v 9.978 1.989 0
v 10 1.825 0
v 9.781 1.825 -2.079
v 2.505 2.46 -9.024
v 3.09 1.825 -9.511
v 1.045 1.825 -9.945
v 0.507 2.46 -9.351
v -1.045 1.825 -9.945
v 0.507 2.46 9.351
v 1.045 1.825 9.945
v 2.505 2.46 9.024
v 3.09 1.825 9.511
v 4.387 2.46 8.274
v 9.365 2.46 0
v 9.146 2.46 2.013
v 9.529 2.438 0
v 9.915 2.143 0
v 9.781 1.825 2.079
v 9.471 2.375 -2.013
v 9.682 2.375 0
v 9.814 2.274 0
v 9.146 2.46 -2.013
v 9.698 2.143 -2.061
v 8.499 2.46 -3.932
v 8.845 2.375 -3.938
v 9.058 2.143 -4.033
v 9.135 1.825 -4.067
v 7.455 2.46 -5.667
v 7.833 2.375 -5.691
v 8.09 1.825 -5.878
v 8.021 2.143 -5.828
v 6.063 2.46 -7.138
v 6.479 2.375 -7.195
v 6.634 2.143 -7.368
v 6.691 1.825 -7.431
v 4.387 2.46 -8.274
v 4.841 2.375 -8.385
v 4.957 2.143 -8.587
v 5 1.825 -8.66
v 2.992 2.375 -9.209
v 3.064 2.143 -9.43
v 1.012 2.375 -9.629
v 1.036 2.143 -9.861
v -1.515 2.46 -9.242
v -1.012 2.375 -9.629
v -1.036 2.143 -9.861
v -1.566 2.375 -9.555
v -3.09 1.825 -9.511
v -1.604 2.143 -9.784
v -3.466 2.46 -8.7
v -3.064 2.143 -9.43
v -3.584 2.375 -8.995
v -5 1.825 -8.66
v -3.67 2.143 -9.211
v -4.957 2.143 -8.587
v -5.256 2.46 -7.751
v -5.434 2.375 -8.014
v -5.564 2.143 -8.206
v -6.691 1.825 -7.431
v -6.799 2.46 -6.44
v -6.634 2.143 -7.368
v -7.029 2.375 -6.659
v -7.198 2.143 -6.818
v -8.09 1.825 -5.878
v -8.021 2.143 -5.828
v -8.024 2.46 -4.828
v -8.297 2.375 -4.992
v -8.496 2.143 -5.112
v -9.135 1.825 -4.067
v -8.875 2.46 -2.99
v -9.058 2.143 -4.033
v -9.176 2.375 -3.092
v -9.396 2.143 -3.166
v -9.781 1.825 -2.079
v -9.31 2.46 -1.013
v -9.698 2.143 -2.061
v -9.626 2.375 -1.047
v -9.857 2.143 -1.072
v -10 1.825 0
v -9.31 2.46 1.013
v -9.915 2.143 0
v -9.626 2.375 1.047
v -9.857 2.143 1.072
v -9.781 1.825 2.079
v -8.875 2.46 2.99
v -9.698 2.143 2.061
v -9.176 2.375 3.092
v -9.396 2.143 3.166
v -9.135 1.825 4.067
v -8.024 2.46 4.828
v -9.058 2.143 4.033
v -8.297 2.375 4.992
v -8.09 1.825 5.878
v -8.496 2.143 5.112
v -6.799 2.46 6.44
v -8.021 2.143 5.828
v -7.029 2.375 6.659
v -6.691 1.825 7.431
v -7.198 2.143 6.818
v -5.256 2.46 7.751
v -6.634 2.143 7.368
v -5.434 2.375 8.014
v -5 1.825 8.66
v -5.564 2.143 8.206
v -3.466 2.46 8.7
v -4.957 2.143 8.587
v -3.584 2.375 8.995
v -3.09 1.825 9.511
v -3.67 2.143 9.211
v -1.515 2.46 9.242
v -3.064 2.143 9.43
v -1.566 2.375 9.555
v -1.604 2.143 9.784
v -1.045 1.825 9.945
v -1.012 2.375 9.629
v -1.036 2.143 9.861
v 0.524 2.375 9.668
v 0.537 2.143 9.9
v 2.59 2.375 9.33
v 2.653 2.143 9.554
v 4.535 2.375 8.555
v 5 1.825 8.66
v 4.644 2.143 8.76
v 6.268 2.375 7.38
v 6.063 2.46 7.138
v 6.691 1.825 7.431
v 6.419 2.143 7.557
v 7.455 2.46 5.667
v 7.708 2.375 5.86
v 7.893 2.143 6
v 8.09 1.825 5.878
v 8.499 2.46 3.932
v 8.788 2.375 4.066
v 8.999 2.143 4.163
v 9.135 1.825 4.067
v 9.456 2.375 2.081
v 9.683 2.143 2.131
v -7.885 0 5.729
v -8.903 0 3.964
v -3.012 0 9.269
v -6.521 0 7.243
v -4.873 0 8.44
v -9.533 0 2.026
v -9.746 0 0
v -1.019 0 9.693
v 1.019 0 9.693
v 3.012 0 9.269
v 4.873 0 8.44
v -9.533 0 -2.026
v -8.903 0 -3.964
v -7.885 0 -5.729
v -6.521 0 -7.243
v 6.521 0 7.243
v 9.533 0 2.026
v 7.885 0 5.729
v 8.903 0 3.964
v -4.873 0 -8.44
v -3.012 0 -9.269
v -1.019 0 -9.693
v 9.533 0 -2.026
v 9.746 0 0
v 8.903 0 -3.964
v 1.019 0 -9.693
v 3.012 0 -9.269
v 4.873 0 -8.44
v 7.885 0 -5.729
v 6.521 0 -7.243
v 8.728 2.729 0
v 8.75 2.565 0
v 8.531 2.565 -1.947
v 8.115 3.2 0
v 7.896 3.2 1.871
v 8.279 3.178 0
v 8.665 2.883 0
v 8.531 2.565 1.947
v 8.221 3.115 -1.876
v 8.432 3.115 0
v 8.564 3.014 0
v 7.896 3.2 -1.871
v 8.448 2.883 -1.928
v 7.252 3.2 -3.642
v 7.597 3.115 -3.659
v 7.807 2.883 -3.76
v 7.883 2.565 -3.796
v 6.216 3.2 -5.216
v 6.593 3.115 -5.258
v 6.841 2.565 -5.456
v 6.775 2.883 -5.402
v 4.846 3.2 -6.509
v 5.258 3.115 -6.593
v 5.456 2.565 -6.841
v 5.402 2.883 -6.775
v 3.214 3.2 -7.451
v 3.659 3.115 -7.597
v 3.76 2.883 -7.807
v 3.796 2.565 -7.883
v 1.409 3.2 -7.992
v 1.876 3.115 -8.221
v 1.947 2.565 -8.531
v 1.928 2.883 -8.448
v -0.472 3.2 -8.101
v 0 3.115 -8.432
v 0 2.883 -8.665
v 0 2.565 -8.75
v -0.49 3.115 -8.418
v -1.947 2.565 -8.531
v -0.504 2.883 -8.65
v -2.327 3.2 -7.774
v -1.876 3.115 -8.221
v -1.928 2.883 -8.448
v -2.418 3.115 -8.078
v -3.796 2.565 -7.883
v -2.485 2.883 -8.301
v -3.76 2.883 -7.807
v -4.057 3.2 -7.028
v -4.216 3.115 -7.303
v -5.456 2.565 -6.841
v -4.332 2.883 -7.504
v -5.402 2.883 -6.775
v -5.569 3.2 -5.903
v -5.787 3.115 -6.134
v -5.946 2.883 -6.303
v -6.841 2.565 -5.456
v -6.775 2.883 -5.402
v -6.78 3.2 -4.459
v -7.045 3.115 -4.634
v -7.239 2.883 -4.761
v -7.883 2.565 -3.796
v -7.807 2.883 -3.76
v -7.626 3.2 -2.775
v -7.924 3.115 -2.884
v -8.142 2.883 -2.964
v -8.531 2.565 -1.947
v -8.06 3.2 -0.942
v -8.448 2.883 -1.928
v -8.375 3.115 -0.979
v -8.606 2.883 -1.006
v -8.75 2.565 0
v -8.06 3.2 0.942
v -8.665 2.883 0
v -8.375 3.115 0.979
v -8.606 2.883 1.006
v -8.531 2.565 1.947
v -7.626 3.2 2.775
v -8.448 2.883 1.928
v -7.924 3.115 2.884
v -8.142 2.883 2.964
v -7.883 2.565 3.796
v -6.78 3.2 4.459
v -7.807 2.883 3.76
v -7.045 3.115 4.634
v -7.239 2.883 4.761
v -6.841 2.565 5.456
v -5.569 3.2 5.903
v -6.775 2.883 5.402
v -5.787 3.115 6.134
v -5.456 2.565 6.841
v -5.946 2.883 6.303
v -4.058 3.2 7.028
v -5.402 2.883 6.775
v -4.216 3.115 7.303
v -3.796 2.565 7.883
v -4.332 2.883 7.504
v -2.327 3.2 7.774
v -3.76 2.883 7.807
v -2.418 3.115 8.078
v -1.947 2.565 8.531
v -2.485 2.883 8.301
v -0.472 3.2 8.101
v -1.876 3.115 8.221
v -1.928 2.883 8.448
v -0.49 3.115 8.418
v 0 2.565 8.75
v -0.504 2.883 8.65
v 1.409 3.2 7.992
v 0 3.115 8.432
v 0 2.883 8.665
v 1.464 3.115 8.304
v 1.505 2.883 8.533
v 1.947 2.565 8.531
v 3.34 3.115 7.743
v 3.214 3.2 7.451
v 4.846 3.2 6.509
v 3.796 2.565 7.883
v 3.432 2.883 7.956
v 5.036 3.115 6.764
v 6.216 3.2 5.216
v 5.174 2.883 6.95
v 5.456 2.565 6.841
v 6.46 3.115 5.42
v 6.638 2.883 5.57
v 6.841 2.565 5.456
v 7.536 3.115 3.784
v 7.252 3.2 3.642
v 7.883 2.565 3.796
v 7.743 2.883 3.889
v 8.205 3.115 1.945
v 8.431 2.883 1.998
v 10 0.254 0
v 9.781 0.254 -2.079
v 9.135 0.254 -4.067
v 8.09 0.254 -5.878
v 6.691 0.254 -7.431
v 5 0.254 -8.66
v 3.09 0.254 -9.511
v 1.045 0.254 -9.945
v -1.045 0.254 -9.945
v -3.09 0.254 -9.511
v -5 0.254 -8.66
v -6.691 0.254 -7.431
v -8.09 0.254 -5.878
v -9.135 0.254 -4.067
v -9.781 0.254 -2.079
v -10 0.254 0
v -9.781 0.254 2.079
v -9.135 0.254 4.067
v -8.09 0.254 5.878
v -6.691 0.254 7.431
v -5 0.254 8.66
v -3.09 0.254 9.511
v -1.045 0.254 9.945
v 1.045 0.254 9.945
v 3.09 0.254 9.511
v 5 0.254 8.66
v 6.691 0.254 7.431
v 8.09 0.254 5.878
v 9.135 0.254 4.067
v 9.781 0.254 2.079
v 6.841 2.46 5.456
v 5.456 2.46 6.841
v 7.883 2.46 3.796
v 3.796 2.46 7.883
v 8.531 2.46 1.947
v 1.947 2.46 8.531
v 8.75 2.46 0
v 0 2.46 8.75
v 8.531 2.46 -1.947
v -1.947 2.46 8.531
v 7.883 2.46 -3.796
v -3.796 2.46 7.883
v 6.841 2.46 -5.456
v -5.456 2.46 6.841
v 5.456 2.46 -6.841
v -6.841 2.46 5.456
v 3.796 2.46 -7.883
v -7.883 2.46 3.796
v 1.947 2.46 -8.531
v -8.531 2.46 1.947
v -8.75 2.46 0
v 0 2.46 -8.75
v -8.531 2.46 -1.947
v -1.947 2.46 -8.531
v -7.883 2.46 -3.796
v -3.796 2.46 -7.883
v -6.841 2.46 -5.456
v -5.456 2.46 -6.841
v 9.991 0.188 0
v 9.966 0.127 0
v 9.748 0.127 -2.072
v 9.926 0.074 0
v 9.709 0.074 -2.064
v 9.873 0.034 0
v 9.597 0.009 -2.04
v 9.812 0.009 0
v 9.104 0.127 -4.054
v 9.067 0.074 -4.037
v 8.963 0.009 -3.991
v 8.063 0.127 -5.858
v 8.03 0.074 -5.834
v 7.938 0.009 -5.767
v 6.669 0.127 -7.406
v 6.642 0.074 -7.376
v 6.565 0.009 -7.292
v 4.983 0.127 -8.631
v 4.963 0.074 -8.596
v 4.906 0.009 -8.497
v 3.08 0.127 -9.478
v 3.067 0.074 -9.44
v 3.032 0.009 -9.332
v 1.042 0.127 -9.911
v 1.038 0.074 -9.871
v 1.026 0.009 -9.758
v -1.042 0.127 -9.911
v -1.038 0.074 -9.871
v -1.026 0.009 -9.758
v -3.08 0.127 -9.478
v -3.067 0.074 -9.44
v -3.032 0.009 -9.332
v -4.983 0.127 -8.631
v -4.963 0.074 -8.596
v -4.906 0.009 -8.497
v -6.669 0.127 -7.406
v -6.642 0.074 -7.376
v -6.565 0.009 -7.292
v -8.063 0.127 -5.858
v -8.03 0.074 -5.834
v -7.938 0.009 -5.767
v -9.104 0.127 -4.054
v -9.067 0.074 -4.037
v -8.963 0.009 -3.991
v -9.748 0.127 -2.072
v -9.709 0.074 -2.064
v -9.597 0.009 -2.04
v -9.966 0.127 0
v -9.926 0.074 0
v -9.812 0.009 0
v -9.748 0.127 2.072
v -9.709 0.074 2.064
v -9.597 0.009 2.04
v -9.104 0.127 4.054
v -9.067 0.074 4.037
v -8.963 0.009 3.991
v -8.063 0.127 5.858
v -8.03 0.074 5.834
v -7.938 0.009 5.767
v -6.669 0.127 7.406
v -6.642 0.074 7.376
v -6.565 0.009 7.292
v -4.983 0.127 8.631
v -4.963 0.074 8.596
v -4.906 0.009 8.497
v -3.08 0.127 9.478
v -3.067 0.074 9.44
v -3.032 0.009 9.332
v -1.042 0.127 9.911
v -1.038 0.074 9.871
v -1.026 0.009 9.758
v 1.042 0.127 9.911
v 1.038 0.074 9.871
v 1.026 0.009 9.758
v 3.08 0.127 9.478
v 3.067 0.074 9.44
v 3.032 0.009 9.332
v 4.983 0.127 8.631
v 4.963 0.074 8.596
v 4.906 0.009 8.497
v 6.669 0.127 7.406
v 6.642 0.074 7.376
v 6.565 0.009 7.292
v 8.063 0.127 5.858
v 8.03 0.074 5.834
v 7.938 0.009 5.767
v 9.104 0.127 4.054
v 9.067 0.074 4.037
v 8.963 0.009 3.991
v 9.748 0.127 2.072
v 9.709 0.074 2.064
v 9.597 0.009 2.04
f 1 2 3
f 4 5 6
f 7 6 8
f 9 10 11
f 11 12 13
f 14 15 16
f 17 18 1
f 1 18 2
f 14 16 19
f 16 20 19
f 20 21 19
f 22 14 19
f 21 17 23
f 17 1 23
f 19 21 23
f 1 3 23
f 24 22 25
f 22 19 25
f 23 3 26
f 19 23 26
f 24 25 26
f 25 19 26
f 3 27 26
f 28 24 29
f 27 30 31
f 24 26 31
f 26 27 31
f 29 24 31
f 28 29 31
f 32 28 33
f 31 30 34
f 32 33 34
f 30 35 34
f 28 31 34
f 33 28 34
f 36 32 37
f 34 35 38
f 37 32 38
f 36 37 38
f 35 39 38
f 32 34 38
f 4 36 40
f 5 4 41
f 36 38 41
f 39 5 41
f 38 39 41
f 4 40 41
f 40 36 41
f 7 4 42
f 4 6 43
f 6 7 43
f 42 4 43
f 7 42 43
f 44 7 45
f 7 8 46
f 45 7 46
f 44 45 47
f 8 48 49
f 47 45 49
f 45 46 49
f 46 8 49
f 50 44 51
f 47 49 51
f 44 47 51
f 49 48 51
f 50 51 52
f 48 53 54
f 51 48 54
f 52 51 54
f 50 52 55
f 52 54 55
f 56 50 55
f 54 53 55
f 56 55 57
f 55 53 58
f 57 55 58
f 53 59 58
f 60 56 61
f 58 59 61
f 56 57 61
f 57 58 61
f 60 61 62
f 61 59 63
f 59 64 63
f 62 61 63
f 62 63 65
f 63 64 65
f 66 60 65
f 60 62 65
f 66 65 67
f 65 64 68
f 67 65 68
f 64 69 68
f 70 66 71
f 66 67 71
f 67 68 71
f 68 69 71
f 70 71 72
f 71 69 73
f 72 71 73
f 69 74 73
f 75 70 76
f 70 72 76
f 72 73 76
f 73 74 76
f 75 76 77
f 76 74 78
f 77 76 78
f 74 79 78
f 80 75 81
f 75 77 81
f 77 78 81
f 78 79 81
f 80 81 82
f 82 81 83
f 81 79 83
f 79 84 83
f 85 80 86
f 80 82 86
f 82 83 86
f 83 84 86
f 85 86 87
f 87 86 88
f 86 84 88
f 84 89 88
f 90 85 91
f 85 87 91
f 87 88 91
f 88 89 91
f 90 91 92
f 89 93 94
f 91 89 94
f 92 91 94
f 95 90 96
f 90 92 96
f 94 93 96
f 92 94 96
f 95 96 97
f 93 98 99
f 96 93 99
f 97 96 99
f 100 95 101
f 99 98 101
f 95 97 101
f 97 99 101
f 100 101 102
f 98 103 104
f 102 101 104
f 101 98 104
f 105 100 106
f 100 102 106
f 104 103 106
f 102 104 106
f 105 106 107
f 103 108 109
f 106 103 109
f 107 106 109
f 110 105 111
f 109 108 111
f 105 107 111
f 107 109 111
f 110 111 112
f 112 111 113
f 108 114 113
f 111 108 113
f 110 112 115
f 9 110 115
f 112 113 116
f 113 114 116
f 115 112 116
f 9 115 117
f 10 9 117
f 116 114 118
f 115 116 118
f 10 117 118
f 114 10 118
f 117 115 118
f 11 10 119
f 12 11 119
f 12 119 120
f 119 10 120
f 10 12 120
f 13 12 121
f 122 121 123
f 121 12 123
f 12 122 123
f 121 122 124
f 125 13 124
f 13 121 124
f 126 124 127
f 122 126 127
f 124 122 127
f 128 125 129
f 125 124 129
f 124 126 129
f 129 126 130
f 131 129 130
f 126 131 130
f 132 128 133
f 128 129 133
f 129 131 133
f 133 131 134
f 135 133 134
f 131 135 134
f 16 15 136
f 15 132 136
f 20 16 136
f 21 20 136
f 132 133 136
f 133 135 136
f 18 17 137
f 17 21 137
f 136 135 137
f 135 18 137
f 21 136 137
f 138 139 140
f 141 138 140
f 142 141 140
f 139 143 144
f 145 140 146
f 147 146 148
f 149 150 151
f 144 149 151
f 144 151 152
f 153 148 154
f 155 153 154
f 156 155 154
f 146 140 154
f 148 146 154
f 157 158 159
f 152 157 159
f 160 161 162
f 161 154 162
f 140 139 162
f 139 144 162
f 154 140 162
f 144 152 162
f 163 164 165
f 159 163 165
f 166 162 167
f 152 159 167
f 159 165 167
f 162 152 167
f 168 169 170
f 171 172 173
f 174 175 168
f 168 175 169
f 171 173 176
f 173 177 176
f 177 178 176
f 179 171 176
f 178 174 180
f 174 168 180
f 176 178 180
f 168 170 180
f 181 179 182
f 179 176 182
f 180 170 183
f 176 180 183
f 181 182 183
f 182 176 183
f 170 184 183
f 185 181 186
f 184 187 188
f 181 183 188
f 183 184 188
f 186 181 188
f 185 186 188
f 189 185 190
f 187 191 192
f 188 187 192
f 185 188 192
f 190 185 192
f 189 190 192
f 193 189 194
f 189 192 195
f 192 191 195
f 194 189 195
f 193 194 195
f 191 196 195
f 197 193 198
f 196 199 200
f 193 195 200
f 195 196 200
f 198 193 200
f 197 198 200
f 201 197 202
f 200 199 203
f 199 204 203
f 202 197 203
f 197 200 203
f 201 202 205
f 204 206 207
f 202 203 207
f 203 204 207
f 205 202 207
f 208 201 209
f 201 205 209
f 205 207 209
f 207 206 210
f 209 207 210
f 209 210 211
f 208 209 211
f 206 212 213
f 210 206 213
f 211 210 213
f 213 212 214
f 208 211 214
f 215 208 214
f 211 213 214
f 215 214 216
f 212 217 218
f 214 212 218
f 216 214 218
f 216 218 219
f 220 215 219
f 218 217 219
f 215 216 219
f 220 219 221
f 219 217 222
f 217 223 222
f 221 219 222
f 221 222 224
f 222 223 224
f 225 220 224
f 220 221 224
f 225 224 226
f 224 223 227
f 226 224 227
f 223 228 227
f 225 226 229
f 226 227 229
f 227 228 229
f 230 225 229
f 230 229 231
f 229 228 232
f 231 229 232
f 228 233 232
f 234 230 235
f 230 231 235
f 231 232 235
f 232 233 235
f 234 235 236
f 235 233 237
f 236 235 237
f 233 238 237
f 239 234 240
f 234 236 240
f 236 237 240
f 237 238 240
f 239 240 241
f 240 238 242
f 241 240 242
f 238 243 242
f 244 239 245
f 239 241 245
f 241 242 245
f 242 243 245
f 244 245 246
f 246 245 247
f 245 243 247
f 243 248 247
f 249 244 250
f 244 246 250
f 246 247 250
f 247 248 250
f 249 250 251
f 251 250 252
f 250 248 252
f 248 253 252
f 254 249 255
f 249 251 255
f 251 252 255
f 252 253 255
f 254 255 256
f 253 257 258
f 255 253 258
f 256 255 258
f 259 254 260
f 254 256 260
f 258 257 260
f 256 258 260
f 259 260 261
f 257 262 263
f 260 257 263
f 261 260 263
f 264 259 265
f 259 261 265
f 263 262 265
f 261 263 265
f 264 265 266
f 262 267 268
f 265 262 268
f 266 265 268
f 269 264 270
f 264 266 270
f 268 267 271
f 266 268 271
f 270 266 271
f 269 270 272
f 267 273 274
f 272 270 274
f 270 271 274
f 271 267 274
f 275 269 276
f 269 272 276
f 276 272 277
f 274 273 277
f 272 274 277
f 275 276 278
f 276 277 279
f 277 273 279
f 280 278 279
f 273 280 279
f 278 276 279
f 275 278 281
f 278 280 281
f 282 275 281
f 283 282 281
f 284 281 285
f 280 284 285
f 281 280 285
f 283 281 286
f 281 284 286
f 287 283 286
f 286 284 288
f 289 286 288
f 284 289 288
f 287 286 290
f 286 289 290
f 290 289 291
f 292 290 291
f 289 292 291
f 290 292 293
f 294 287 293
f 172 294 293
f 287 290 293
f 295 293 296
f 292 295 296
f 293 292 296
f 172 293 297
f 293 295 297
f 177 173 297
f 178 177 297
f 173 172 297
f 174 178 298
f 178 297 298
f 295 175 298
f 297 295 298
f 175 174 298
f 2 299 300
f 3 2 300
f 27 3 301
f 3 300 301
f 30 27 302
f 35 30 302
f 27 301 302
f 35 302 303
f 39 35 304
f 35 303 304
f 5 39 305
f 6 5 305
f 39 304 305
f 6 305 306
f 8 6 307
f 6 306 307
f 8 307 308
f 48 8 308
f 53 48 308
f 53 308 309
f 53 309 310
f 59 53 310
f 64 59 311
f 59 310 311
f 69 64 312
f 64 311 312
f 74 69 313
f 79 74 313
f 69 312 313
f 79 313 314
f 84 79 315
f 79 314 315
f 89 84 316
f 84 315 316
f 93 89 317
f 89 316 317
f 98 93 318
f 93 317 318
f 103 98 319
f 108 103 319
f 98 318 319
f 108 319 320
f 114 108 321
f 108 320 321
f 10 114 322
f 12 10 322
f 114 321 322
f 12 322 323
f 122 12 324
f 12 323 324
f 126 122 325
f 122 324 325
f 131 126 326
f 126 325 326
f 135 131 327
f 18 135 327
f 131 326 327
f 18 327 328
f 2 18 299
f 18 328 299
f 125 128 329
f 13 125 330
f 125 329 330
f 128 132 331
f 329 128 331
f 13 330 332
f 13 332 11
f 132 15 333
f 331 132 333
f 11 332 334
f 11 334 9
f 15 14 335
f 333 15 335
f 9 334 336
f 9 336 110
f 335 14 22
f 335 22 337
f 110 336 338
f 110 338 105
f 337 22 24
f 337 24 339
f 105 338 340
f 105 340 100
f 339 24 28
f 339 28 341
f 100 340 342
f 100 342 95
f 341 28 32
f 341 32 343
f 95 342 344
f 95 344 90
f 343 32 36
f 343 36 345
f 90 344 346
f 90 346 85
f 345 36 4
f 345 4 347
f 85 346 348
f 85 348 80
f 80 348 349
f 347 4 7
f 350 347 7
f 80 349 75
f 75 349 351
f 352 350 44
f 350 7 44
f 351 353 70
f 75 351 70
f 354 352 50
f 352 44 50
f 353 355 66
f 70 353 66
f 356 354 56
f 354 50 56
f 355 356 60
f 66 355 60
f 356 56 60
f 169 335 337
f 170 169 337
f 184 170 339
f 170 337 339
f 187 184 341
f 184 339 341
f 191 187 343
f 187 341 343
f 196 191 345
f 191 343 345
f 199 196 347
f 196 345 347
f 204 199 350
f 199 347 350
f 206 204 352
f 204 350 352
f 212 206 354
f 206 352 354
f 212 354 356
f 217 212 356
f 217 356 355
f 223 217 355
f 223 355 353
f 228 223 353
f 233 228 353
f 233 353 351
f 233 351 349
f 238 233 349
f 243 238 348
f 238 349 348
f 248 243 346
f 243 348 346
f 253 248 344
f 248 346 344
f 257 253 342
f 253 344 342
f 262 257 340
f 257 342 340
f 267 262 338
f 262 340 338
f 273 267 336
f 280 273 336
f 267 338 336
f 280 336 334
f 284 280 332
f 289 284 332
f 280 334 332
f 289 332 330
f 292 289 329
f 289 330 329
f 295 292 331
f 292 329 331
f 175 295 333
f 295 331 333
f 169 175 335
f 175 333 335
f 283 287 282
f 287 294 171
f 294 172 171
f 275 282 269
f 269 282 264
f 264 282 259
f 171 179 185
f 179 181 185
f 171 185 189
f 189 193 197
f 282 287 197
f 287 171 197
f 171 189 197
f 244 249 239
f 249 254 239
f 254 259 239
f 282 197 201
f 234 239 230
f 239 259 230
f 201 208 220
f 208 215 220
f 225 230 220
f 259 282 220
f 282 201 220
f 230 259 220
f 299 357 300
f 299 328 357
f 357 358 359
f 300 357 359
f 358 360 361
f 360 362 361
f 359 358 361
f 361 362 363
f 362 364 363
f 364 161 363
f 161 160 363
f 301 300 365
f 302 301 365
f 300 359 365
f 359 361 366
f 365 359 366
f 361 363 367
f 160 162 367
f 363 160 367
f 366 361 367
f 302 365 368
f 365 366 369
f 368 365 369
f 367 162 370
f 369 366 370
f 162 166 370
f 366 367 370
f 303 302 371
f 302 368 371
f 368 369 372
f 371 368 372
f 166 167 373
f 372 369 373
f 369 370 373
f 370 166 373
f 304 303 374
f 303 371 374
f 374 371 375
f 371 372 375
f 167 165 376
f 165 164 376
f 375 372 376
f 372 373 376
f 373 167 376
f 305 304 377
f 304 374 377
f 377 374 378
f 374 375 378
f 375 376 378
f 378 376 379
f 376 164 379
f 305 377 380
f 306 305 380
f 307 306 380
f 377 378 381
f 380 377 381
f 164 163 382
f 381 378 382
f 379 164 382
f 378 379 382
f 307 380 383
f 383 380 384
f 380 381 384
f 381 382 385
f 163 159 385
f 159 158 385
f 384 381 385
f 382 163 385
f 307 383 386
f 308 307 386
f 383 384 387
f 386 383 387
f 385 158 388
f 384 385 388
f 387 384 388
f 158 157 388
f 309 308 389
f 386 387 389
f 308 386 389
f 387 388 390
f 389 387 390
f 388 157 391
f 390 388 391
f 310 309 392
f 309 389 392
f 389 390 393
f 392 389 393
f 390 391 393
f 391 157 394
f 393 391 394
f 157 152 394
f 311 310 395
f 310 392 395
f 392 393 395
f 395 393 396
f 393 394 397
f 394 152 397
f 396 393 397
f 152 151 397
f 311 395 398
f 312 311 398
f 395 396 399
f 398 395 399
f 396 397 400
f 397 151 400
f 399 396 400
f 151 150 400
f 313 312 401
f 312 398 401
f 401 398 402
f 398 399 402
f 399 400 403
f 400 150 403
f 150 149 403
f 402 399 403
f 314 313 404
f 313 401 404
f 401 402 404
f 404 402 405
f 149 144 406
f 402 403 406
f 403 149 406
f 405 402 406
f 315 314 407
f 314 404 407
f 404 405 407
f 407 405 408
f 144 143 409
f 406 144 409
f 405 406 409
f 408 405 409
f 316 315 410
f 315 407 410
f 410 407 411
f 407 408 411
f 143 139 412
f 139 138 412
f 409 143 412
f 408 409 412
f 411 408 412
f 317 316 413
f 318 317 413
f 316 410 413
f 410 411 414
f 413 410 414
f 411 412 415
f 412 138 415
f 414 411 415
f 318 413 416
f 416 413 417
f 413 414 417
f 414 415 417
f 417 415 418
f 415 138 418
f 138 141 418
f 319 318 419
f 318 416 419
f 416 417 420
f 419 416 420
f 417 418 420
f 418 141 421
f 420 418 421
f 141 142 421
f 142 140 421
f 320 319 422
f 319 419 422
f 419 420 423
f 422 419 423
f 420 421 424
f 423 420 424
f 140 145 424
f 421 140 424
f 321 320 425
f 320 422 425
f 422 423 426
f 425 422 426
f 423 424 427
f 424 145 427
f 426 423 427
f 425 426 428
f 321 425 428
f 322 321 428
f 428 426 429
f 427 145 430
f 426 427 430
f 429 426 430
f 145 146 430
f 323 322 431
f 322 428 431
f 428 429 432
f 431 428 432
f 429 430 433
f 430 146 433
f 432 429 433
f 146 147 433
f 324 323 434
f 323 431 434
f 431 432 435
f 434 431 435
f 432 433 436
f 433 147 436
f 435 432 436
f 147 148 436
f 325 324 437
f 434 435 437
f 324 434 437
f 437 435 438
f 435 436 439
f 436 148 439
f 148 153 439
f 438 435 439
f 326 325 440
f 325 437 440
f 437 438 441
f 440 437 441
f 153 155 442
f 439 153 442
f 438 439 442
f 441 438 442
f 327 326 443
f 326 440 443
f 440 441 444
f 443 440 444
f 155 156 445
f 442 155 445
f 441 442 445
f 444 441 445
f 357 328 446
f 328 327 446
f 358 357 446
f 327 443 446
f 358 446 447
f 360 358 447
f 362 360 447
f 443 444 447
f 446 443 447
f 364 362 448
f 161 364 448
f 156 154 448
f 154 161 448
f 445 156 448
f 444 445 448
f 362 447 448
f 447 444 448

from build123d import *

# Parameters (mm, degrees)
FILLET1_R = 0.635
FILLET2_R = 0.254


with BuildPart() as part:
    # Sketch1 → Revolve1 (revolve)
    with BuildSketch(Plane.XY):
        Polygon((0, 0), (0, 3.2), (8.75, 3.2), (8.75, 2.46), (10, 2.46), (10, 0), align=None)
    revolve(axis=Axis((0, 0, 0), (0, 1, 0)))

    # Fillet1
    fillet1_edges = [part.edges().sort_by_distance(p)[0] for p in [
        (-10, 2.46, 0),
        (-8.75, 3.2, 0),
    ]]
    fillet(fillet1_edges, radius=FILLET1_R)

    # Fillet2
    fillet2_edges = [part.edges().sort_by_distance(p)[0] for p in [
        (-10, 0, 0),
    ]]
    fillet(fillet2_edges, radius=FILLET2_R)


solid = part.part
